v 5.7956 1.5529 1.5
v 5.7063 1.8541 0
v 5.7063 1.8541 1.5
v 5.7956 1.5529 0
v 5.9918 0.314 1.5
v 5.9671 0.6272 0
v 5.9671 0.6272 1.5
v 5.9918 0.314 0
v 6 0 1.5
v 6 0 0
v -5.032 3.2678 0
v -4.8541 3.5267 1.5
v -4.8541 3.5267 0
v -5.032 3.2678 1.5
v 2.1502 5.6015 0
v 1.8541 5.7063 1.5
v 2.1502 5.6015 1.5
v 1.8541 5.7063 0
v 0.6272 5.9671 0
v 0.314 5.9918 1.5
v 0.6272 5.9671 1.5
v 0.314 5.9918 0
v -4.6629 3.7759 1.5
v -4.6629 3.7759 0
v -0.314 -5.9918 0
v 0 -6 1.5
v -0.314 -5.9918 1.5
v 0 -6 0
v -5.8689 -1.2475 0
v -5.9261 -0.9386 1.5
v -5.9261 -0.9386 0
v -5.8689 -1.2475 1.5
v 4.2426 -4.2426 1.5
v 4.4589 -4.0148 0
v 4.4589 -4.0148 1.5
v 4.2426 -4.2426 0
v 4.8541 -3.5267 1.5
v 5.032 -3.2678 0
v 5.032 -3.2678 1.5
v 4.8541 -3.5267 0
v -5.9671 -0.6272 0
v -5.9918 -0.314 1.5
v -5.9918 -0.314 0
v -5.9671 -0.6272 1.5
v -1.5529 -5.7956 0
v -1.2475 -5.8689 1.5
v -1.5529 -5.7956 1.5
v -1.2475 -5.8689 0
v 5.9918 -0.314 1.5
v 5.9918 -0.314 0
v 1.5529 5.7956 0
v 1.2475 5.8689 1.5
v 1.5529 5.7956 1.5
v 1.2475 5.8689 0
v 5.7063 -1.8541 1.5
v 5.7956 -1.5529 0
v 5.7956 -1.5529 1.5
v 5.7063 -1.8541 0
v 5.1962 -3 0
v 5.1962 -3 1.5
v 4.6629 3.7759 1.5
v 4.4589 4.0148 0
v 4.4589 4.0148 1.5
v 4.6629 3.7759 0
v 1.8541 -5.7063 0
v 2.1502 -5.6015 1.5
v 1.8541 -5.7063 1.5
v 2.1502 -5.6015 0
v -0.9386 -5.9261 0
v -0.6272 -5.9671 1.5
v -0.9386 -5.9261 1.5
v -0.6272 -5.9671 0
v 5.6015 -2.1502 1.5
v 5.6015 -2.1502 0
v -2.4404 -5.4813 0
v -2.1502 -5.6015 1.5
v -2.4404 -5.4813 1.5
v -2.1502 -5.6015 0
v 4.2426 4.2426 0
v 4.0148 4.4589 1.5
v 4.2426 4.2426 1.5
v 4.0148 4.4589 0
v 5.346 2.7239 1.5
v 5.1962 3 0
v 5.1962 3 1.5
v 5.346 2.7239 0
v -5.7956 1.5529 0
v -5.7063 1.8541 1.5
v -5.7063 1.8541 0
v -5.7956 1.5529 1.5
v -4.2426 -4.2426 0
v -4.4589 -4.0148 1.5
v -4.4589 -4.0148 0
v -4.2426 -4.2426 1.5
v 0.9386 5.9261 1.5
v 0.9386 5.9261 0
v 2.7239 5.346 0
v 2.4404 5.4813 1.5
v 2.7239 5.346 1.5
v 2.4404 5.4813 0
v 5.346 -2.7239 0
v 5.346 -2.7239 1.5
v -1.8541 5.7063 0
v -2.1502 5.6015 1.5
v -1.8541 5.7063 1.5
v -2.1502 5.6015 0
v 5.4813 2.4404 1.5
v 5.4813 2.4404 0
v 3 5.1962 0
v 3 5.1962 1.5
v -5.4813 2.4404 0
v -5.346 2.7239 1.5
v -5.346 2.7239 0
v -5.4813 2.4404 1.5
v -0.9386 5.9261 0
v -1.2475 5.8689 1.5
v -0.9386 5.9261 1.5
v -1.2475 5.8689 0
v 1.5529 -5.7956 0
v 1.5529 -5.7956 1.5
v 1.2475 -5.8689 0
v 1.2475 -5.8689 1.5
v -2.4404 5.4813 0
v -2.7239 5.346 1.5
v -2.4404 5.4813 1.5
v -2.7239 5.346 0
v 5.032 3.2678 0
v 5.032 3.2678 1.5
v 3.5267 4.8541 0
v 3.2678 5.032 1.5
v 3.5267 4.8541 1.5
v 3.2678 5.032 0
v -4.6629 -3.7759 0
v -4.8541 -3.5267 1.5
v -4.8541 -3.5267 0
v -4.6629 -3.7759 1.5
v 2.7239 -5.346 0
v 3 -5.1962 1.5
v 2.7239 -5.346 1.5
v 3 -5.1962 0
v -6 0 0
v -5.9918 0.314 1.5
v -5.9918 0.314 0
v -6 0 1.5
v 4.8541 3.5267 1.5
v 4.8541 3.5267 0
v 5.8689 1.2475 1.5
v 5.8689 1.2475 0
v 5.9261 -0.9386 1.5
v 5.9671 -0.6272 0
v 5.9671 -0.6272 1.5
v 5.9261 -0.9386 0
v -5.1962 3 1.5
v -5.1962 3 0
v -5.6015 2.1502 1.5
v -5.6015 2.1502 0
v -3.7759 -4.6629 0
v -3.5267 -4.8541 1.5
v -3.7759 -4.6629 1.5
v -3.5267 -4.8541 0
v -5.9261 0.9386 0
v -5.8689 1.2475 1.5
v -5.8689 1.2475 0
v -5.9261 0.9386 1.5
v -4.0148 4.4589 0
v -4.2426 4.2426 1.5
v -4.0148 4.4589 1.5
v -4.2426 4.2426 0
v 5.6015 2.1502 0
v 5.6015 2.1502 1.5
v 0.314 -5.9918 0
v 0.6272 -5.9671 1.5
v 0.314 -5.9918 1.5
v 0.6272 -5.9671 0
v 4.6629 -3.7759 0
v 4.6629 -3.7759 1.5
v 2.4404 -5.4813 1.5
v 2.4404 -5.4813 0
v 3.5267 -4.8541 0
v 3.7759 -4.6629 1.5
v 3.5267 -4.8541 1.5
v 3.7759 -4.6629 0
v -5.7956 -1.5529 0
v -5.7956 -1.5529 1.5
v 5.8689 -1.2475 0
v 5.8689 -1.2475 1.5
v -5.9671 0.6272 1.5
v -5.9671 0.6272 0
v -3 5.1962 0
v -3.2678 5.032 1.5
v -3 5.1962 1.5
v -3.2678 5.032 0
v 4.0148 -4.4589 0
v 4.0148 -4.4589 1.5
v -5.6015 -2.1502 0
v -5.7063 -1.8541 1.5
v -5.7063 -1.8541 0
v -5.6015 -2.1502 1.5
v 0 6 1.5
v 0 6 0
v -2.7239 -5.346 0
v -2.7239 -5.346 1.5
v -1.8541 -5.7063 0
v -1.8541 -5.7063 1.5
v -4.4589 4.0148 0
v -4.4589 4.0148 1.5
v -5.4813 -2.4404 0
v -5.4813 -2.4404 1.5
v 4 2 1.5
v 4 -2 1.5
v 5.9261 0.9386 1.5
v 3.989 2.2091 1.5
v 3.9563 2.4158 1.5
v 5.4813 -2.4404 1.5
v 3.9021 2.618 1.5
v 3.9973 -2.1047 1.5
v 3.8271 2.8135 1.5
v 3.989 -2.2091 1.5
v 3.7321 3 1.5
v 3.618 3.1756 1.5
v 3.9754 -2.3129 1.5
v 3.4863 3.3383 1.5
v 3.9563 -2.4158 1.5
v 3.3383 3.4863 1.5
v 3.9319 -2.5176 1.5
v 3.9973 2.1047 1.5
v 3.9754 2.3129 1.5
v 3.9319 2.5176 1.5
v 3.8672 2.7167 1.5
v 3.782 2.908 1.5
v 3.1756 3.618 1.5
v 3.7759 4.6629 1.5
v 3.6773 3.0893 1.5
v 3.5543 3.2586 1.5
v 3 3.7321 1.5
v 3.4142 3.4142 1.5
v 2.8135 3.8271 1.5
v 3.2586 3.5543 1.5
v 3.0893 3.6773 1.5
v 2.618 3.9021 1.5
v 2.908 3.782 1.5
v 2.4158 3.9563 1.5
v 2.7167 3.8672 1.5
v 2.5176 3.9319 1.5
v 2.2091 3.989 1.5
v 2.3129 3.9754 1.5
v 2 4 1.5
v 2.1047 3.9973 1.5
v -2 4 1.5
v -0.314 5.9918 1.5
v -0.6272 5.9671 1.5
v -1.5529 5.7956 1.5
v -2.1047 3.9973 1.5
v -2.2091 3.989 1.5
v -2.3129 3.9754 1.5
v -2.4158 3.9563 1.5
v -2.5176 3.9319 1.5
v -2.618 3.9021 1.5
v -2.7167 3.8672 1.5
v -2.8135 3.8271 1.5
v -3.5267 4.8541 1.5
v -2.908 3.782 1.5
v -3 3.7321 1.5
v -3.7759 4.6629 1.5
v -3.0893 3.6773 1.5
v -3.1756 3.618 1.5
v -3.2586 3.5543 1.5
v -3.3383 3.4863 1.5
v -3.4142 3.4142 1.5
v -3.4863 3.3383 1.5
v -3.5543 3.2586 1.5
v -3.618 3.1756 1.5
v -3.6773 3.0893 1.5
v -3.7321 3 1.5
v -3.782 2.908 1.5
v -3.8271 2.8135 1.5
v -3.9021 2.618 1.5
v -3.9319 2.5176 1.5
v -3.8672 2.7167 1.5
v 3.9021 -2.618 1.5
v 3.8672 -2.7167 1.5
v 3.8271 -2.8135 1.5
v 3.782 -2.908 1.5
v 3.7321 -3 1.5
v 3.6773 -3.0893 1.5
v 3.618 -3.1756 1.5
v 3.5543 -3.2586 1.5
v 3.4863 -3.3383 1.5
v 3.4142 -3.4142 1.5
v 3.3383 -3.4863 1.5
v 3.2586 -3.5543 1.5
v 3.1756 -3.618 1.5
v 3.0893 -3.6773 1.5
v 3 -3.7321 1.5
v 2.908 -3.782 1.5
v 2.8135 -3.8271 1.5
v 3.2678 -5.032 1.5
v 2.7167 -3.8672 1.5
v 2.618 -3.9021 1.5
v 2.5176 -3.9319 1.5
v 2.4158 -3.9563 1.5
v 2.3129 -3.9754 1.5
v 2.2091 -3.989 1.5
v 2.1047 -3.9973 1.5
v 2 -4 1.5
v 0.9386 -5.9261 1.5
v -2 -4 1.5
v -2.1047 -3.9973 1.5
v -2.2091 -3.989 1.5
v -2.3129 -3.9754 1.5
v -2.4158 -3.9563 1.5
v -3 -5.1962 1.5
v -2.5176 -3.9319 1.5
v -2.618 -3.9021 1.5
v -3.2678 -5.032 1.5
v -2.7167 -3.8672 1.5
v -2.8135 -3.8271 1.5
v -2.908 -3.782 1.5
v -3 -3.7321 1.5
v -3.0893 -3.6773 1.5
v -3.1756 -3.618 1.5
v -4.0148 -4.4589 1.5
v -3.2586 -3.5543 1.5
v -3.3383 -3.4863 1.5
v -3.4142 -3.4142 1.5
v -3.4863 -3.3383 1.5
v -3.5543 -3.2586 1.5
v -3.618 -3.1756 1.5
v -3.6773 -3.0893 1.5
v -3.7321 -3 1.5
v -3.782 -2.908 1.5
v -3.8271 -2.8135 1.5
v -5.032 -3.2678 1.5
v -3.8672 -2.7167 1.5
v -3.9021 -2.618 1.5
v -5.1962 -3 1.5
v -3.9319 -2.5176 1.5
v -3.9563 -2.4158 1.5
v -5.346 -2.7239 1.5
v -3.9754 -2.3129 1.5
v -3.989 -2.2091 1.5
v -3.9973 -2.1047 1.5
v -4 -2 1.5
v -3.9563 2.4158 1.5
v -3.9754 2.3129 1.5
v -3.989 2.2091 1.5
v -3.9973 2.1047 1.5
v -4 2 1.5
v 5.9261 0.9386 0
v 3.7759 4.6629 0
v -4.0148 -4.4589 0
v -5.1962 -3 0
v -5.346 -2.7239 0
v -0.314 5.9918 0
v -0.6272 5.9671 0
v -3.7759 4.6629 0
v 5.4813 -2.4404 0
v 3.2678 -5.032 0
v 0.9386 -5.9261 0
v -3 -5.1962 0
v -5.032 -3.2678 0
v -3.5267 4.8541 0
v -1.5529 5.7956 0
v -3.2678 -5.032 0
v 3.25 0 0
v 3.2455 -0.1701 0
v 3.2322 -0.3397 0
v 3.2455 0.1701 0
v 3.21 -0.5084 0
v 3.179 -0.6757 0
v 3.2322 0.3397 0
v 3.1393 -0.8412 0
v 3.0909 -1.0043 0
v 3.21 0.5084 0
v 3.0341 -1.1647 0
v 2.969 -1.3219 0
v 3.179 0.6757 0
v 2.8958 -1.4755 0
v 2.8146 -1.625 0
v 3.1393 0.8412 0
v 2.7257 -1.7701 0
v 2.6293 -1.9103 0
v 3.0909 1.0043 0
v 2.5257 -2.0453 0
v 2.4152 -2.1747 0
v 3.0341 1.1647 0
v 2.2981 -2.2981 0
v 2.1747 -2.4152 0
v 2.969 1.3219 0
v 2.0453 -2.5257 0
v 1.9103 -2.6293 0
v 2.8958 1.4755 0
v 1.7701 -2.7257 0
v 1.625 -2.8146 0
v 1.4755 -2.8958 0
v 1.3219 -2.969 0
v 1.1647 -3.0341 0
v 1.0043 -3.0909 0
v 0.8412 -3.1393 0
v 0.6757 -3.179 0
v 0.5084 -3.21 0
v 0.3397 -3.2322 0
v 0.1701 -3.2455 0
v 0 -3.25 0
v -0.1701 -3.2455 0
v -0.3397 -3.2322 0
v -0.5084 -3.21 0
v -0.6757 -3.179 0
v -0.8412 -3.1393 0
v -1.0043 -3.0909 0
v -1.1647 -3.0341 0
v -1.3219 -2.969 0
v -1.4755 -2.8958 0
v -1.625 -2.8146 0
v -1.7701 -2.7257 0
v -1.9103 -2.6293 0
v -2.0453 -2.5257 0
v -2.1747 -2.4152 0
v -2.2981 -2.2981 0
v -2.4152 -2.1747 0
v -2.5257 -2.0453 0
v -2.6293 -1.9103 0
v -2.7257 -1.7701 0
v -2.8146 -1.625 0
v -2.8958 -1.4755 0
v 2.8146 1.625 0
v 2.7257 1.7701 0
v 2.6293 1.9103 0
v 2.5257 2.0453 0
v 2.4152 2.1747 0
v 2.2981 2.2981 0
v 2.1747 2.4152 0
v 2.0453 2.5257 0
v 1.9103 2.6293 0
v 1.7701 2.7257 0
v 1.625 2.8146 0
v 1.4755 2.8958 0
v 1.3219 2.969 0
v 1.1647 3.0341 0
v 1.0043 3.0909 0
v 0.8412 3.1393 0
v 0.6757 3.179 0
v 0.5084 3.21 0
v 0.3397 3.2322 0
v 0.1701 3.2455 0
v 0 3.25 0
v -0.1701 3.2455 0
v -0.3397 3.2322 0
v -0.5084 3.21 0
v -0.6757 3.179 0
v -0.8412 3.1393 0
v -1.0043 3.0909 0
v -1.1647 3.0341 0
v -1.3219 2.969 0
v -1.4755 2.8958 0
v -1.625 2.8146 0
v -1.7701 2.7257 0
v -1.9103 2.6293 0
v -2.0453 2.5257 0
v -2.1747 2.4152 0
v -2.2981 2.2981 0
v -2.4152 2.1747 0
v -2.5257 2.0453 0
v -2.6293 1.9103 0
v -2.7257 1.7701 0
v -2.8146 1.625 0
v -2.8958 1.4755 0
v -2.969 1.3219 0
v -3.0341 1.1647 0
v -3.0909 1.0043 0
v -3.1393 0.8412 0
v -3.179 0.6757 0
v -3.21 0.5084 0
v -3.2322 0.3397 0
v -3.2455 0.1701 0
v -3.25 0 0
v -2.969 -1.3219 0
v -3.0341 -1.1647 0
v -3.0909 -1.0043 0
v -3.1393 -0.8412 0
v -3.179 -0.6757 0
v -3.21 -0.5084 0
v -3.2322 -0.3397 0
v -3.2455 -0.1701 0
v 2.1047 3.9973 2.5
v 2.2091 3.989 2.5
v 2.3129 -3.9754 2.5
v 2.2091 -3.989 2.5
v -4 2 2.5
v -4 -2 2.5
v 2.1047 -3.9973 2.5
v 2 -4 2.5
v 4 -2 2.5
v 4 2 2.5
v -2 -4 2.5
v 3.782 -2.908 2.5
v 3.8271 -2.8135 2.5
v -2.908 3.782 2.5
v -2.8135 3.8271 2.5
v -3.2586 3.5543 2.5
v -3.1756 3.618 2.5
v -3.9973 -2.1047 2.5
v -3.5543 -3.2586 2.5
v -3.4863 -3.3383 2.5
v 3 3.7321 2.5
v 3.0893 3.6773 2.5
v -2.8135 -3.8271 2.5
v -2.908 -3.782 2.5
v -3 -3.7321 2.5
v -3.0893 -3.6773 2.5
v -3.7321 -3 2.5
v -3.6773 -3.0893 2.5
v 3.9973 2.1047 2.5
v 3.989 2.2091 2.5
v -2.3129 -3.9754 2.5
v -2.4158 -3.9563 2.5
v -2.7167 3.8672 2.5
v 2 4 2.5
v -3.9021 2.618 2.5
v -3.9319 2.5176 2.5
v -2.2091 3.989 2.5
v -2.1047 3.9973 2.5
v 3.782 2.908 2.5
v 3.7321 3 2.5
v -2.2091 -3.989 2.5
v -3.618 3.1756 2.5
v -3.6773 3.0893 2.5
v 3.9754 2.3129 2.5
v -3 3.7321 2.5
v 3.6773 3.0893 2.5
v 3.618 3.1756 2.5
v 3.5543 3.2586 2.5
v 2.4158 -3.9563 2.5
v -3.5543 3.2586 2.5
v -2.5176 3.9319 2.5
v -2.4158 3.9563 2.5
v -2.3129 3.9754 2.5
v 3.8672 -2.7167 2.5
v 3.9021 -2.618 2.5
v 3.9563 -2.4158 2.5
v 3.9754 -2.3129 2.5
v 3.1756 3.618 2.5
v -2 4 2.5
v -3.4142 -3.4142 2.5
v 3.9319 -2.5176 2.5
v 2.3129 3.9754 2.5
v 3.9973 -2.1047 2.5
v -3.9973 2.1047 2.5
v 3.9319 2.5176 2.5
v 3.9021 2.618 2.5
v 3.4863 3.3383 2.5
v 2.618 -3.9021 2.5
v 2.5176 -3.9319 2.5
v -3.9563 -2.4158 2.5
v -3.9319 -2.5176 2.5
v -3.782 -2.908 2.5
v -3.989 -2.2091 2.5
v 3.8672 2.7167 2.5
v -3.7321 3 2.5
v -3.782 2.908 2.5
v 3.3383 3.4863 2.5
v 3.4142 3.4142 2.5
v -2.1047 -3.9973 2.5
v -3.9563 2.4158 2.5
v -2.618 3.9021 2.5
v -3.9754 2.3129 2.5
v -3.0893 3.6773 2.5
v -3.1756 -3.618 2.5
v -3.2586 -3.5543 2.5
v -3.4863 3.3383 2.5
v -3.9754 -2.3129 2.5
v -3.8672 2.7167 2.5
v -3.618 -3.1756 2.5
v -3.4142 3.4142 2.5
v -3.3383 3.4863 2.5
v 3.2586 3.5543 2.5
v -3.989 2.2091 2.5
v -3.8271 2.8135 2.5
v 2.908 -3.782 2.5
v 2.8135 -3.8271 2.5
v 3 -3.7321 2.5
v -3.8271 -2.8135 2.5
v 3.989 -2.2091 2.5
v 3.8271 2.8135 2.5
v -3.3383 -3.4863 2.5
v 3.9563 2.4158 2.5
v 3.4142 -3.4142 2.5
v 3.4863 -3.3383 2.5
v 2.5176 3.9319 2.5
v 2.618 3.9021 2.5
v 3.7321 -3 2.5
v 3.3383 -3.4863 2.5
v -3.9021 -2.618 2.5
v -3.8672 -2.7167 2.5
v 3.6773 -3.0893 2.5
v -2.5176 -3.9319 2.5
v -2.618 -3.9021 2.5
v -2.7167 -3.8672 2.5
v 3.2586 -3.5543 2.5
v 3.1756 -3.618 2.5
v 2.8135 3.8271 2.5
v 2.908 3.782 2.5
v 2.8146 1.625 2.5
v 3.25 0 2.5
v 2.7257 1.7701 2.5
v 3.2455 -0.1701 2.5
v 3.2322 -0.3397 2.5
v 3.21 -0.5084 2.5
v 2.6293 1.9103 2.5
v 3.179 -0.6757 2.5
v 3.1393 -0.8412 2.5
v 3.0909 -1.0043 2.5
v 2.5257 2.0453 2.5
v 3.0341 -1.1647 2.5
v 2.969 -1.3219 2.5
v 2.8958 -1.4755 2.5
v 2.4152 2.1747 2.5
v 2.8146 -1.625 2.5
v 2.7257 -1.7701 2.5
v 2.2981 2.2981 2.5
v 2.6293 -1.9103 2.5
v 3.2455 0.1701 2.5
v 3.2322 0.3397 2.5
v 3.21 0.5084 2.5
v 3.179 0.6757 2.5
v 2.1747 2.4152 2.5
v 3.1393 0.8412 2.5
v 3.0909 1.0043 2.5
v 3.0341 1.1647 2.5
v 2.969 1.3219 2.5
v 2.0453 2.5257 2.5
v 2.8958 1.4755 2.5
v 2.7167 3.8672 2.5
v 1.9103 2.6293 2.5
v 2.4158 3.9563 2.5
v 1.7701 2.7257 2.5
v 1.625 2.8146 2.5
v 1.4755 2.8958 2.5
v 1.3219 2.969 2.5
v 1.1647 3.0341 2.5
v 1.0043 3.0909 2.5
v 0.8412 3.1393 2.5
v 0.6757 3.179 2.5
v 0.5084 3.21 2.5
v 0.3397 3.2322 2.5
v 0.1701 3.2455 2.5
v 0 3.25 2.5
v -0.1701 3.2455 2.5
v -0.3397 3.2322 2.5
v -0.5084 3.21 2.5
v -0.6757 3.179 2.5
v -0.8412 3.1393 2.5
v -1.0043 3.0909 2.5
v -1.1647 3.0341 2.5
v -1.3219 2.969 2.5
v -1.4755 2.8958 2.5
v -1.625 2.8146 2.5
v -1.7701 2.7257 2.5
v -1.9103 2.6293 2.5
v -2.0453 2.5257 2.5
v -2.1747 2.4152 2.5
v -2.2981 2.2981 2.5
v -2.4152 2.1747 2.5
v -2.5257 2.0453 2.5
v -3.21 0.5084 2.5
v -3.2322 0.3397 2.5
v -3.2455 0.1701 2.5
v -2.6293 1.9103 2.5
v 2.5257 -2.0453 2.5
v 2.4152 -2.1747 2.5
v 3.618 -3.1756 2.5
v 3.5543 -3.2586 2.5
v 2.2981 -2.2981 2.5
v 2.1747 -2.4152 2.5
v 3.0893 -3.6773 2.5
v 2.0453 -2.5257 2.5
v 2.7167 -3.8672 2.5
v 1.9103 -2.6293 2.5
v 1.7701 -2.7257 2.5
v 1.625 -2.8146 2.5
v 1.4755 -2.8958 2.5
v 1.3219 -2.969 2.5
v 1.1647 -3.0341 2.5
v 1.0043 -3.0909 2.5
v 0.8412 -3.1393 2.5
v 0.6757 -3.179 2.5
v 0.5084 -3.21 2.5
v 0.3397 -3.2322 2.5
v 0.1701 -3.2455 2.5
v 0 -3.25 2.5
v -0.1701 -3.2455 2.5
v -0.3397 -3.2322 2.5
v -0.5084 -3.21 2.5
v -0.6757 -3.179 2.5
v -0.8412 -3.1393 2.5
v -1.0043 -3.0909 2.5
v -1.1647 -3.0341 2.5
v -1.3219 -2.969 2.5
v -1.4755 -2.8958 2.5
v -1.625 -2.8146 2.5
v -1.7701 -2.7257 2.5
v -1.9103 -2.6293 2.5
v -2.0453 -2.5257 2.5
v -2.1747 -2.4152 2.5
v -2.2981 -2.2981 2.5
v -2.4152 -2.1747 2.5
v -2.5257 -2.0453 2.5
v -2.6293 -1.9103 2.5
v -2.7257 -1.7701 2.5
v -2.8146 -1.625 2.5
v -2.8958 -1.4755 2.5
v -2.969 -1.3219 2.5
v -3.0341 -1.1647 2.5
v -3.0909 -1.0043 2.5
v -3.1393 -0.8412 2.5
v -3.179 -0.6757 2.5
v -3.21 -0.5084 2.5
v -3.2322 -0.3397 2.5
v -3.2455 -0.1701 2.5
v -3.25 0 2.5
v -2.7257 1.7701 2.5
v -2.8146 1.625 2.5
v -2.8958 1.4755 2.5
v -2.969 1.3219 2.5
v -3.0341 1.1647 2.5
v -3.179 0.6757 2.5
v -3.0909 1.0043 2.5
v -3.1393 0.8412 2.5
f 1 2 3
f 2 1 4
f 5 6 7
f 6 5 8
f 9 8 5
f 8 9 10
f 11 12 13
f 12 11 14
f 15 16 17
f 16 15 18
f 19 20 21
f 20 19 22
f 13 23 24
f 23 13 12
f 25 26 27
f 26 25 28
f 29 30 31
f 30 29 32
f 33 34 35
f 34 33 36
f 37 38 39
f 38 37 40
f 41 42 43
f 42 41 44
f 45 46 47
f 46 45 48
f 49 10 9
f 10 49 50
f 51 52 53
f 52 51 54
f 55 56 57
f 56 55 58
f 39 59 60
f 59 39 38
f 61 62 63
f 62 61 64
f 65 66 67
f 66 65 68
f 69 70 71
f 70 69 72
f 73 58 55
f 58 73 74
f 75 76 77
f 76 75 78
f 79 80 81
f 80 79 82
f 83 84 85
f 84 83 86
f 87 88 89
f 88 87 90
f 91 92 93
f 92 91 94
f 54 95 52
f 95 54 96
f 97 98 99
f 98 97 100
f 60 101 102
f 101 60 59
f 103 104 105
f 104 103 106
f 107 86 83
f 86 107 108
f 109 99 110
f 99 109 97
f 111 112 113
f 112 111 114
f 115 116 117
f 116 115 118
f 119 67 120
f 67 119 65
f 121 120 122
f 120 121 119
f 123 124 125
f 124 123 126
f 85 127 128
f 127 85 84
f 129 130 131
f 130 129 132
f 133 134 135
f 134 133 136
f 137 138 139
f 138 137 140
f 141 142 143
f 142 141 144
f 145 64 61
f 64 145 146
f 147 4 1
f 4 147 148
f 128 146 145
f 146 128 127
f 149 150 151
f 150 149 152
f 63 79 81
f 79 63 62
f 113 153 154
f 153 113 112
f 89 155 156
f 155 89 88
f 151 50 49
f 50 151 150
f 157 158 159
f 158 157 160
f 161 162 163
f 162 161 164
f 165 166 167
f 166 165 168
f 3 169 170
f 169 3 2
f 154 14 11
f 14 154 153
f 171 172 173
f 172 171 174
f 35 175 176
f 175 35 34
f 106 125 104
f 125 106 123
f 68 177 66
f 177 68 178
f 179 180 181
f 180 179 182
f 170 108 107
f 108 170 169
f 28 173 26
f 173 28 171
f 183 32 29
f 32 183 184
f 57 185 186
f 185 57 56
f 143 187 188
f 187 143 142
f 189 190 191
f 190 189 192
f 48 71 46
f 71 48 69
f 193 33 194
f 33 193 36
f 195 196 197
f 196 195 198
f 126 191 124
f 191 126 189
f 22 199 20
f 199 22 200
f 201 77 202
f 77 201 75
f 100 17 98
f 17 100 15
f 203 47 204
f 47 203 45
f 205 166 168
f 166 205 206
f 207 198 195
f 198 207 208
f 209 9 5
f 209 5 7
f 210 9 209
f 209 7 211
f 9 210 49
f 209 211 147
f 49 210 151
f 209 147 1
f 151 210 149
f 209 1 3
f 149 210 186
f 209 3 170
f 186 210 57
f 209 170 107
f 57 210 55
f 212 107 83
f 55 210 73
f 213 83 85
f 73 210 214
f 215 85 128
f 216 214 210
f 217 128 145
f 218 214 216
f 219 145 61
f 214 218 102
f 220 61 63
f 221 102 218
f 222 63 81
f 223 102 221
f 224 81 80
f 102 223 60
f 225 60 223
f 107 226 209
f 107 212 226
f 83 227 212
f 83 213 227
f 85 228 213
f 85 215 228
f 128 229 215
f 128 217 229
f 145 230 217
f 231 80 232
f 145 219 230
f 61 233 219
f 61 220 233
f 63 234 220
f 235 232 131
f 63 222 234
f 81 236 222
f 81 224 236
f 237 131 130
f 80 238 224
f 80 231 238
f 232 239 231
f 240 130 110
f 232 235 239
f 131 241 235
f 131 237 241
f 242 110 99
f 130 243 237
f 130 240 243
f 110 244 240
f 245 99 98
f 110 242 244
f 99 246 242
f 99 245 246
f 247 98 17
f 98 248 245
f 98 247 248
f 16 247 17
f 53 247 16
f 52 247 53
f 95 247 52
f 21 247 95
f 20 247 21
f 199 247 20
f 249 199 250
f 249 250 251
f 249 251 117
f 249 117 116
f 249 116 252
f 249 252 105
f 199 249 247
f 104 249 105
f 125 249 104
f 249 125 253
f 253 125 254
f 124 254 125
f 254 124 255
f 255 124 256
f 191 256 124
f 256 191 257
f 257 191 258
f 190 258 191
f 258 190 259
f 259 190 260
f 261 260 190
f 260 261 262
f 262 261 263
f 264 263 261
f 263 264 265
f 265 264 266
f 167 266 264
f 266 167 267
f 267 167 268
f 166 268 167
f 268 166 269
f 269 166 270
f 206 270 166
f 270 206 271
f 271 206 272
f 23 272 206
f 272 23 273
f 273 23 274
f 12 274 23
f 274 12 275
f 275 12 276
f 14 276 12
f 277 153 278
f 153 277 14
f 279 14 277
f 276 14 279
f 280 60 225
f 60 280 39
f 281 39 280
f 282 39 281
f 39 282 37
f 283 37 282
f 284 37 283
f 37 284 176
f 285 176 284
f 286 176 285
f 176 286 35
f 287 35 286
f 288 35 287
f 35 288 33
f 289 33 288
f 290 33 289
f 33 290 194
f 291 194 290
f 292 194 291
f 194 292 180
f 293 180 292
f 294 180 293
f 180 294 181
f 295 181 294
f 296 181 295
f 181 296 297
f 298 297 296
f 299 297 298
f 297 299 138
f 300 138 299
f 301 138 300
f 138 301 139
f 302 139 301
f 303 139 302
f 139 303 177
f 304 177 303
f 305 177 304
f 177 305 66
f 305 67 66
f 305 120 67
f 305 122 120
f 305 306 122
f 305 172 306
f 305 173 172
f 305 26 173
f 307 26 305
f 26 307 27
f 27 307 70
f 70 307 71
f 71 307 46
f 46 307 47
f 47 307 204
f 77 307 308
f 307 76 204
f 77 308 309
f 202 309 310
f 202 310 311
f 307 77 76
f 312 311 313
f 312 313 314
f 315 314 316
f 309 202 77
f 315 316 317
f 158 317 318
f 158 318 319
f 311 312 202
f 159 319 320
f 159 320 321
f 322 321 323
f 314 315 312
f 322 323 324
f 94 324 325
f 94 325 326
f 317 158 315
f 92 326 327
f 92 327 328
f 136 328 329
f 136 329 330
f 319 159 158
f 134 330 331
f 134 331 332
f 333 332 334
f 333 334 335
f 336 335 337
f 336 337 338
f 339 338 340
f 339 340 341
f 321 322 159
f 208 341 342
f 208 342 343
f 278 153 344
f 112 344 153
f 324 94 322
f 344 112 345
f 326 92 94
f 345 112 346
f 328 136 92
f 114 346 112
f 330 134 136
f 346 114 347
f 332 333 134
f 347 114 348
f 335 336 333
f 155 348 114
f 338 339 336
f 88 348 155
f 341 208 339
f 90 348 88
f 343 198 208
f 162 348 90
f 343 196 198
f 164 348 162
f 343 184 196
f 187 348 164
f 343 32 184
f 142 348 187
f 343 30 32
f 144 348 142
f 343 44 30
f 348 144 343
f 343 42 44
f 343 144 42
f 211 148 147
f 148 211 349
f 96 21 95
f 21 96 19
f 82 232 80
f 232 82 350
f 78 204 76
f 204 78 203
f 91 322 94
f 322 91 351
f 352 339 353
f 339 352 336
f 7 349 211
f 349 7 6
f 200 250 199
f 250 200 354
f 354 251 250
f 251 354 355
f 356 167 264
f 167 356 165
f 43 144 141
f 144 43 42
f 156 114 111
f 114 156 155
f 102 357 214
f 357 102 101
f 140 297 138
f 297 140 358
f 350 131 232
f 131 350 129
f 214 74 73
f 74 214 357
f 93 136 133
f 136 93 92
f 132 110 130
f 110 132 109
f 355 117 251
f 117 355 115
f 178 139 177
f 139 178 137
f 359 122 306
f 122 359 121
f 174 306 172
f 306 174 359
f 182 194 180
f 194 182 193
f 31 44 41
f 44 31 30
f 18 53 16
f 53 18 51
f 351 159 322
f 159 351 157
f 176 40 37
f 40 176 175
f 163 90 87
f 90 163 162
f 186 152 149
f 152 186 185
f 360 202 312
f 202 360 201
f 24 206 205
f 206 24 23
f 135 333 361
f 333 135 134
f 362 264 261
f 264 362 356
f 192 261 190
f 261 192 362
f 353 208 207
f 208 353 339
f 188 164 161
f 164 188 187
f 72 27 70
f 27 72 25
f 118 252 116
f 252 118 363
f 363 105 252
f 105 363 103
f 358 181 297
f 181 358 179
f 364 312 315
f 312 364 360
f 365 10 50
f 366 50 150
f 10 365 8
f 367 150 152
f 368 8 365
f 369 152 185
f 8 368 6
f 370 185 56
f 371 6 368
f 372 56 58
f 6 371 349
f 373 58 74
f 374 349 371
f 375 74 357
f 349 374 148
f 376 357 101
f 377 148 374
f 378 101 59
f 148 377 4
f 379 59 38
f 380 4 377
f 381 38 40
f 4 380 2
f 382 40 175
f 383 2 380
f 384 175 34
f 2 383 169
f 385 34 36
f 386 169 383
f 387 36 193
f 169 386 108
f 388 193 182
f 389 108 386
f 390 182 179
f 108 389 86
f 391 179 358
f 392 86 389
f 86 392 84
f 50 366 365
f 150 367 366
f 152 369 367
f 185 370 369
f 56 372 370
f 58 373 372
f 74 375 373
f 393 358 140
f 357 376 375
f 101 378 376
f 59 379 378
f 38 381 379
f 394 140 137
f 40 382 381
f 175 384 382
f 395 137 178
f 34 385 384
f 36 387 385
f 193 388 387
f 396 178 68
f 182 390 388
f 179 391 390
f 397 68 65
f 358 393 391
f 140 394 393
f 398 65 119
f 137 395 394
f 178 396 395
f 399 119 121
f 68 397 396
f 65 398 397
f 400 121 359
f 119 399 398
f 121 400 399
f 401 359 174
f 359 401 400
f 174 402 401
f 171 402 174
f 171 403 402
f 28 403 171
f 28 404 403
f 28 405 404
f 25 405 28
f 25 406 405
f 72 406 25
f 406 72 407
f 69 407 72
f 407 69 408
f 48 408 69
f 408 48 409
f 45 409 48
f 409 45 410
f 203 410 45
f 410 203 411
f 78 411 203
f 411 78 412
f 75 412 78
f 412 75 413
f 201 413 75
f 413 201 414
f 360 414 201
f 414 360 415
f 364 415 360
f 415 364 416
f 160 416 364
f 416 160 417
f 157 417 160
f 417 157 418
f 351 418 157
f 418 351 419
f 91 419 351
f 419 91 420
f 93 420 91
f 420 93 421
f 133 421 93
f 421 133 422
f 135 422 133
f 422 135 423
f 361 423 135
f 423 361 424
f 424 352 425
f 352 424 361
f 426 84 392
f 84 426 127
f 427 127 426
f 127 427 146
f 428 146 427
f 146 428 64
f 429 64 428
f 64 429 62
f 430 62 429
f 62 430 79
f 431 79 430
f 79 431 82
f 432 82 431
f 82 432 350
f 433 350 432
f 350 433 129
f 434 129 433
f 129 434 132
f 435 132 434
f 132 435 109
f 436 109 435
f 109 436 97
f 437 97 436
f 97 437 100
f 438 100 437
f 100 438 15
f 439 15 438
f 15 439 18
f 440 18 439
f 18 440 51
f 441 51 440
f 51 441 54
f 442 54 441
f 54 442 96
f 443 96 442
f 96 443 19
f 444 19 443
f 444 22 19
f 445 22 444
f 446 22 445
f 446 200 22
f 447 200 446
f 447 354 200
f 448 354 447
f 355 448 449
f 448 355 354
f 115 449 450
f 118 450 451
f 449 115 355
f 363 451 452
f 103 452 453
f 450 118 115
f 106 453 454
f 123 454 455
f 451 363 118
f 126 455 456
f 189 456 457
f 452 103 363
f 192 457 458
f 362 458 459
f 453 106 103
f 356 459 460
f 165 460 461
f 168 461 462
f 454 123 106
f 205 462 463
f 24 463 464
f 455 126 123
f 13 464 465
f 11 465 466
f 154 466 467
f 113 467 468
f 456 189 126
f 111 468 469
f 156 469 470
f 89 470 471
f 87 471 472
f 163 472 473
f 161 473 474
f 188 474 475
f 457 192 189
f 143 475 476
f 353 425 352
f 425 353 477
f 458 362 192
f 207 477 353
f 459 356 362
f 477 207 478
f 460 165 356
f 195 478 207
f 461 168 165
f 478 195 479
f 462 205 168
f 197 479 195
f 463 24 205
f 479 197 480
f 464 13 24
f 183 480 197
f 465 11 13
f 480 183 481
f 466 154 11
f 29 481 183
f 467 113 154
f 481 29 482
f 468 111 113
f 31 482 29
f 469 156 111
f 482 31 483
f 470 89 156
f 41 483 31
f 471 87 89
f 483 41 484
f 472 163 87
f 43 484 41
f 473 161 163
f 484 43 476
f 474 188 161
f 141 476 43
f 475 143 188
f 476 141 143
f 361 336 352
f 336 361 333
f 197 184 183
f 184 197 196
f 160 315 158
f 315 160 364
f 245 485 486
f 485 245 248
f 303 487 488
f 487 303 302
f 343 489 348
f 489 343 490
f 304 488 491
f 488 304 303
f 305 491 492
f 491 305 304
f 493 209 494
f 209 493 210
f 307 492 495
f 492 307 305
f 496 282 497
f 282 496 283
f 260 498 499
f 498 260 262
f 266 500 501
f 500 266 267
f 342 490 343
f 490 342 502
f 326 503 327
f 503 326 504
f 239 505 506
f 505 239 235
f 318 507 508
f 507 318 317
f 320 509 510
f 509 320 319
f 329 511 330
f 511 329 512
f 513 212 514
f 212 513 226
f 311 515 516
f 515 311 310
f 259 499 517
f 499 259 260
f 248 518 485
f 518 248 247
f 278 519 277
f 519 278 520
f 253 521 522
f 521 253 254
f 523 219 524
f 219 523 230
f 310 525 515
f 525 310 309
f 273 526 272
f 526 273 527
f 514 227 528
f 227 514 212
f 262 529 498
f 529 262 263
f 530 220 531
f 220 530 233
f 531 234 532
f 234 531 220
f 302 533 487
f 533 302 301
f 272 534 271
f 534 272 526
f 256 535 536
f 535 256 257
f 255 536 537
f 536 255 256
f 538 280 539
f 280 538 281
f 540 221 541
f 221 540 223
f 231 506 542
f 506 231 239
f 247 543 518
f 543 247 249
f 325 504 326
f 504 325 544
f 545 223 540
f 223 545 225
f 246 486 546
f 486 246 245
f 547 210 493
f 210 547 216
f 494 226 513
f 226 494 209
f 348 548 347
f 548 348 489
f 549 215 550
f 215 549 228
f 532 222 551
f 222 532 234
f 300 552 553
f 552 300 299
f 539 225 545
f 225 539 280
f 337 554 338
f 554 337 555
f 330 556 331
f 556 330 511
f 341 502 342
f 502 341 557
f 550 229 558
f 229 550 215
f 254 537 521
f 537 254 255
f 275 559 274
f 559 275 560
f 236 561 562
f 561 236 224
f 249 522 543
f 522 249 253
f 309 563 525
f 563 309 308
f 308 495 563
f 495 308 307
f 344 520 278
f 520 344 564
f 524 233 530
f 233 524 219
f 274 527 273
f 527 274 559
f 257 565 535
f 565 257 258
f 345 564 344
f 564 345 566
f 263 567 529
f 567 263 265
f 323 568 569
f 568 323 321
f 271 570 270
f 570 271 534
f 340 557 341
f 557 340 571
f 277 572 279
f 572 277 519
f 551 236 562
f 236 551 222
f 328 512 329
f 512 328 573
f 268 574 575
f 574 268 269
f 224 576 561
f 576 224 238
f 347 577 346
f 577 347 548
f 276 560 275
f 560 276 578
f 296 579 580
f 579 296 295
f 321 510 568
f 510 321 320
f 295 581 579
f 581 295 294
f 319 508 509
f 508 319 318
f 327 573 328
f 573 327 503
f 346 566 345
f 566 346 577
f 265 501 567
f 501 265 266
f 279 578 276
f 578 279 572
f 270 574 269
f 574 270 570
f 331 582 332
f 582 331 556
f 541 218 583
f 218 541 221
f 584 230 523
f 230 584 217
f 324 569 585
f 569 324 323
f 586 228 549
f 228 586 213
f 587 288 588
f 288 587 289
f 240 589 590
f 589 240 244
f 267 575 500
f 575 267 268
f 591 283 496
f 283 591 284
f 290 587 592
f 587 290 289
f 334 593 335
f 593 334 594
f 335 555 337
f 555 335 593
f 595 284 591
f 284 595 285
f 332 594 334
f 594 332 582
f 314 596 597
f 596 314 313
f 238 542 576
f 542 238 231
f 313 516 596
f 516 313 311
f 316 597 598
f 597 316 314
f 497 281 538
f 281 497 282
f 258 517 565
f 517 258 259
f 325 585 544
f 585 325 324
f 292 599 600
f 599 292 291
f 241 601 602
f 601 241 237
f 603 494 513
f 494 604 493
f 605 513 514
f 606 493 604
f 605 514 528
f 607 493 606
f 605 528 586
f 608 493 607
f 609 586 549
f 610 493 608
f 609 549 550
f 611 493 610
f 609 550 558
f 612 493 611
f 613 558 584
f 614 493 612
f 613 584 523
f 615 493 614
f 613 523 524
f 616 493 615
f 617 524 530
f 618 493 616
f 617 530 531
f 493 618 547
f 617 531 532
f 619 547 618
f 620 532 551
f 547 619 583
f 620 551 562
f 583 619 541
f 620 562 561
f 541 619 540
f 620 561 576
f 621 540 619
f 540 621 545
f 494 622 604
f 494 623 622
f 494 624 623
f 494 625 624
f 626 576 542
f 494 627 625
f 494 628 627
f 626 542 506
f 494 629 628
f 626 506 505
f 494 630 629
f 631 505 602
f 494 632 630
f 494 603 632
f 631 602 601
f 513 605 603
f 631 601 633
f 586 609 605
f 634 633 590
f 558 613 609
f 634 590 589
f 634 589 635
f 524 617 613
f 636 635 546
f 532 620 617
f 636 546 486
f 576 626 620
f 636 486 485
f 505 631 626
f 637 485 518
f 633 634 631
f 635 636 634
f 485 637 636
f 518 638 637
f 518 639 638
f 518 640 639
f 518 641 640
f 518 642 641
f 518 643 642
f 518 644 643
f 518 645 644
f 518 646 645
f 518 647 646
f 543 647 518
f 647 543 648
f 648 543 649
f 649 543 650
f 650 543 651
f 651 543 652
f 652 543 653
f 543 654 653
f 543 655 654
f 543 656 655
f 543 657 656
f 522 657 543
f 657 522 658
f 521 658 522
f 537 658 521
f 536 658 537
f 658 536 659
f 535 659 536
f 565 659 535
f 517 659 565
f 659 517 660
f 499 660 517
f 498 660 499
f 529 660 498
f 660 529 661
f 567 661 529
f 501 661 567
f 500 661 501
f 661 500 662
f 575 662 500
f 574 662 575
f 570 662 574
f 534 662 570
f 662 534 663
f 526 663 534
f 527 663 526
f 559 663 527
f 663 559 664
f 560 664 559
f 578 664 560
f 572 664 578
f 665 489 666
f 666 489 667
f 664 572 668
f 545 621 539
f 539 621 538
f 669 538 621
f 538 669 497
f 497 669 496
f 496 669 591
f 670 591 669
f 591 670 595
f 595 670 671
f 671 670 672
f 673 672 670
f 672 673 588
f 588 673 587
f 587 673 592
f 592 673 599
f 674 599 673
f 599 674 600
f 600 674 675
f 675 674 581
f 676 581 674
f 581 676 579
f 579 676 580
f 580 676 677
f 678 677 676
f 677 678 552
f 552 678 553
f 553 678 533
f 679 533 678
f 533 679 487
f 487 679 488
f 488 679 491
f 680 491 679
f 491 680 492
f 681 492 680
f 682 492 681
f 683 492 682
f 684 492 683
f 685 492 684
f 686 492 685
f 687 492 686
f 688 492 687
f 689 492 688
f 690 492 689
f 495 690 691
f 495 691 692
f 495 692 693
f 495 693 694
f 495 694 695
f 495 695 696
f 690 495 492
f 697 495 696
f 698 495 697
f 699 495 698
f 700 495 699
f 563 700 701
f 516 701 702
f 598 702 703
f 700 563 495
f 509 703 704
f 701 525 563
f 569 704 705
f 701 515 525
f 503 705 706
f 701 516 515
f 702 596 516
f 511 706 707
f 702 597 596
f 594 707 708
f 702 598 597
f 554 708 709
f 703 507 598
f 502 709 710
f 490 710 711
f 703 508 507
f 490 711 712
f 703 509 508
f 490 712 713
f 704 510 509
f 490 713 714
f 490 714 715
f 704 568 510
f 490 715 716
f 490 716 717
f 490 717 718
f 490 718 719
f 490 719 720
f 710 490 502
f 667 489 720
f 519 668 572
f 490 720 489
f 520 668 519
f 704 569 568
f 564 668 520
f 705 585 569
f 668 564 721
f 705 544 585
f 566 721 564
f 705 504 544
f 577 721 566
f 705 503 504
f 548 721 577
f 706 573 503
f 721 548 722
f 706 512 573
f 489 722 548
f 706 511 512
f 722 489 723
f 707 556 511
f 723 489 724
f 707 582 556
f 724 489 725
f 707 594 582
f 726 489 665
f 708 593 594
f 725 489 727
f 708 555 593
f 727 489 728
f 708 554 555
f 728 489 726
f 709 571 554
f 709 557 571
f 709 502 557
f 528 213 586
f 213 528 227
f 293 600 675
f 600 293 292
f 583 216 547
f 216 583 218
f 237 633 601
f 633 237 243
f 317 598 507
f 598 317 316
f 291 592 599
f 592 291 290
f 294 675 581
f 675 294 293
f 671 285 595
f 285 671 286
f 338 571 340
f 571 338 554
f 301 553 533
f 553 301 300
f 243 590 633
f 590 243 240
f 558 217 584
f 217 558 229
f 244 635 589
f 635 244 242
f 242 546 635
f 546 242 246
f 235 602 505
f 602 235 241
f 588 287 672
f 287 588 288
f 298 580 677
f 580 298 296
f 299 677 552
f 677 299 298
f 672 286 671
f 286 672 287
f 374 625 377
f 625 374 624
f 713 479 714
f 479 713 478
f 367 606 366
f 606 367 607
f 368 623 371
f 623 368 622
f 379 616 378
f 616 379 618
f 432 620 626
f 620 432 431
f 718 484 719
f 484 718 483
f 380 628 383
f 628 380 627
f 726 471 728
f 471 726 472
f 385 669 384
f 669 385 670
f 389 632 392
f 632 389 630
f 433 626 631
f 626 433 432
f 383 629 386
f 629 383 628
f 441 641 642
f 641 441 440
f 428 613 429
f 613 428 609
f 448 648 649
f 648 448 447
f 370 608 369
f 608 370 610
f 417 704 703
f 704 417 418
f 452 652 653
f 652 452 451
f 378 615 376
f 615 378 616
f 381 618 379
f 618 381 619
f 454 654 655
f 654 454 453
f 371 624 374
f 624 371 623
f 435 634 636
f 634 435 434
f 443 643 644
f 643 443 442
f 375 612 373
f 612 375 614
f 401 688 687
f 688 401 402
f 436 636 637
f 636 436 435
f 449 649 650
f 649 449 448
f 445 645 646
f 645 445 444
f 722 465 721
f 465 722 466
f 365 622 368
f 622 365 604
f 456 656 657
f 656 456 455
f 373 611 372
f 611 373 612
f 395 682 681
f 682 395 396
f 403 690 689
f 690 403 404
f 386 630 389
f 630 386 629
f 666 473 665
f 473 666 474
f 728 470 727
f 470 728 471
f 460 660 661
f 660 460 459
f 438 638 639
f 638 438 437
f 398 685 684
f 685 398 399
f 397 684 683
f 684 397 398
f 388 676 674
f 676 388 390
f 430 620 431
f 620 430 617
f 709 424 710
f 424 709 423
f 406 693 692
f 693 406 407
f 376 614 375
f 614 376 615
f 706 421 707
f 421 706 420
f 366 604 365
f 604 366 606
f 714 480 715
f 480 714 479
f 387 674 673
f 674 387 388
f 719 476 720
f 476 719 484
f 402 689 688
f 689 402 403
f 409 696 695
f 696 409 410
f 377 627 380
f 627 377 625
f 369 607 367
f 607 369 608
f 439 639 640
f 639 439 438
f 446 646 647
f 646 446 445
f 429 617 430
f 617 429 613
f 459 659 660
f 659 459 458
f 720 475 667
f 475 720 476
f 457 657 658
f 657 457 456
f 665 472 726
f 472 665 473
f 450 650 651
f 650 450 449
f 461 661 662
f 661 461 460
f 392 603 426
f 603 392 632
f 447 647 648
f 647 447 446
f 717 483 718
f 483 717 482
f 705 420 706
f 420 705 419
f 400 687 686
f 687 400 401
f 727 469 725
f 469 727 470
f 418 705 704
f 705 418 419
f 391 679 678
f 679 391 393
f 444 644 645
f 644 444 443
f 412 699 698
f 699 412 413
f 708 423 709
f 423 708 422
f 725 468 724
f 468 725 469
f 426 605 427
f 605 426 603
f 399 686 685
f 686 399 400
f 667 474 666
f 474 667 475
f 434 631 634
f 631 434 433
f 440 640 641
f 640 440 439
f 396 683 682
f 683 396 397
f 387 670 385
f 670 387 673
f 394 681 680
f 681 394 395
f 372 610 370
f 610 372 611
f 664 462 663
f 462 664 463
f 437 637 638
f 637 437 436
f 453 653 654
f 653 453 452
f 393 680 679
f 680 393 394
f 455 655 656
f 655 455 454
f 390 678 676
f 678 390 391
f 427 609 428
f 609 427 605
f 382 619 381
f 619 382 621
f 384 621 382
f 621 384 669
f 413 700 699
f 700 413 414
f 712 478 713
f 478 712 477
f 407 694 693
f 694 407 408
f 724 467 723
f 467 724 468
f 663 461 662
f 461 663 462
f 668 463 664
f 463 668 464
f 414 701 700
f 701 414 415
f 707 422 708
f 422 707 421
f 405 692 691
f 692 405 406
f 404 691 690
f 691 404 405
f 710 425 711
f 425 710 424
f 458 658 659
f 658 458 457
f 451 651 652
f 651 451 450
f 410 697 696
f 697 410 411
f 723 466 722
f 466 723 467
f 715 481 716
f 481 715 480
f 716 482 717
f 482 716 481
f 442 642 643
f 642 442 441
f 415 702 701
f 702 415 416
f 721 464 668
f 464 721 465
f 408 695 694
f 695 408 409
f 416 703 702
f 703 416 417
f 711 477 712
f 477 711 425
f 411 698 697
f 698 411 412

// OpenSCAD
// ===================================================================
// File: washer_with_locator.scad
// Version: v0.04
// Description: Parametric and modular washer with a fixed global shape 
//              switch for square or round centering sections.
// ===================================================================

// --- GLOBAL PARAMETERS ---
$fn = 120; // Rendering resolution for smooth circles/corners

// Washer parameters
WASHER_OD = 12.0;    // Washer Outer Diameter (mm)
WASHER_ID = 6.5;     // Washer Inner Hole Diameter (mm)
WASHER_T  = 1.5;     // Washer Thickness (mm)

// Centering section type: "square" or "round"
LOCATOR_SHAPE  = "square"; // Muuda siin: "square" või "round"

// Square centering section parameters
LOCATOR_SIZE   = 8.0;     // Square side length (mm)
LOCATOR_RADIUS = 2.0;     // Corner radius (mm)

// Round centering section parameters (for adapting to a bigger round hole)
LOCATOR_OD     = 10.0;    // Outer diameter of the round centering collar (mm)

// Centering section thickness / height
LOCATOR_T      = 1.0;     // Thickness of the centering section (mm)


// --- MODULAR COMPONENTS ---

/**
 * Creates a 2D rounded square centered at the origin.
 */
module rounded_square_2d(size, r) {
    offset(r = r) {
        square([size - 2 * r, size - 2 * r], center = true);
    }
}

/**
 * Creates a washer with an integrated centering section (square or round).
 */
module washer_with_locator(
    od = WASHER_OD,
    id = WASHER_ID,
    t_washer = WASHER_T,
    shape = "square",
    loc_size = LOCATOR_SIZE,
    loc_r = LOCATOR_RADIUS,
    loc_od = LOCATOR_OD,
    t_loc = LOCATOR_T
) {
    difference() {
        union() {
            // Main Washer Body
            cylinder(d = od, h = t_washer);
            
            // Centering Section (Square or Round) on top of the washer body
            translate([0, 0, t_washer])
                linear_extrude(height = t_loc) {
                    if (shape == "round") {
                        circle(d = loc_od);
                    } else {
                        rounded_square_2d(loc_size, loc_r);
                    }
                }
        }
        
        // Continuous Center Hole for the Bolt
        translate([0, 0, -0.1])
            cylinder(d = id, h = t_washer + t_loc + 0.2);
    }
}


// --- MAIN INSTANTIATION ---
// Kasutab automaatselt faili alguses määratud LOCATOR_SHAPE väärtust
washer_with_locator(shape = LOCATOR_SHAPE);
